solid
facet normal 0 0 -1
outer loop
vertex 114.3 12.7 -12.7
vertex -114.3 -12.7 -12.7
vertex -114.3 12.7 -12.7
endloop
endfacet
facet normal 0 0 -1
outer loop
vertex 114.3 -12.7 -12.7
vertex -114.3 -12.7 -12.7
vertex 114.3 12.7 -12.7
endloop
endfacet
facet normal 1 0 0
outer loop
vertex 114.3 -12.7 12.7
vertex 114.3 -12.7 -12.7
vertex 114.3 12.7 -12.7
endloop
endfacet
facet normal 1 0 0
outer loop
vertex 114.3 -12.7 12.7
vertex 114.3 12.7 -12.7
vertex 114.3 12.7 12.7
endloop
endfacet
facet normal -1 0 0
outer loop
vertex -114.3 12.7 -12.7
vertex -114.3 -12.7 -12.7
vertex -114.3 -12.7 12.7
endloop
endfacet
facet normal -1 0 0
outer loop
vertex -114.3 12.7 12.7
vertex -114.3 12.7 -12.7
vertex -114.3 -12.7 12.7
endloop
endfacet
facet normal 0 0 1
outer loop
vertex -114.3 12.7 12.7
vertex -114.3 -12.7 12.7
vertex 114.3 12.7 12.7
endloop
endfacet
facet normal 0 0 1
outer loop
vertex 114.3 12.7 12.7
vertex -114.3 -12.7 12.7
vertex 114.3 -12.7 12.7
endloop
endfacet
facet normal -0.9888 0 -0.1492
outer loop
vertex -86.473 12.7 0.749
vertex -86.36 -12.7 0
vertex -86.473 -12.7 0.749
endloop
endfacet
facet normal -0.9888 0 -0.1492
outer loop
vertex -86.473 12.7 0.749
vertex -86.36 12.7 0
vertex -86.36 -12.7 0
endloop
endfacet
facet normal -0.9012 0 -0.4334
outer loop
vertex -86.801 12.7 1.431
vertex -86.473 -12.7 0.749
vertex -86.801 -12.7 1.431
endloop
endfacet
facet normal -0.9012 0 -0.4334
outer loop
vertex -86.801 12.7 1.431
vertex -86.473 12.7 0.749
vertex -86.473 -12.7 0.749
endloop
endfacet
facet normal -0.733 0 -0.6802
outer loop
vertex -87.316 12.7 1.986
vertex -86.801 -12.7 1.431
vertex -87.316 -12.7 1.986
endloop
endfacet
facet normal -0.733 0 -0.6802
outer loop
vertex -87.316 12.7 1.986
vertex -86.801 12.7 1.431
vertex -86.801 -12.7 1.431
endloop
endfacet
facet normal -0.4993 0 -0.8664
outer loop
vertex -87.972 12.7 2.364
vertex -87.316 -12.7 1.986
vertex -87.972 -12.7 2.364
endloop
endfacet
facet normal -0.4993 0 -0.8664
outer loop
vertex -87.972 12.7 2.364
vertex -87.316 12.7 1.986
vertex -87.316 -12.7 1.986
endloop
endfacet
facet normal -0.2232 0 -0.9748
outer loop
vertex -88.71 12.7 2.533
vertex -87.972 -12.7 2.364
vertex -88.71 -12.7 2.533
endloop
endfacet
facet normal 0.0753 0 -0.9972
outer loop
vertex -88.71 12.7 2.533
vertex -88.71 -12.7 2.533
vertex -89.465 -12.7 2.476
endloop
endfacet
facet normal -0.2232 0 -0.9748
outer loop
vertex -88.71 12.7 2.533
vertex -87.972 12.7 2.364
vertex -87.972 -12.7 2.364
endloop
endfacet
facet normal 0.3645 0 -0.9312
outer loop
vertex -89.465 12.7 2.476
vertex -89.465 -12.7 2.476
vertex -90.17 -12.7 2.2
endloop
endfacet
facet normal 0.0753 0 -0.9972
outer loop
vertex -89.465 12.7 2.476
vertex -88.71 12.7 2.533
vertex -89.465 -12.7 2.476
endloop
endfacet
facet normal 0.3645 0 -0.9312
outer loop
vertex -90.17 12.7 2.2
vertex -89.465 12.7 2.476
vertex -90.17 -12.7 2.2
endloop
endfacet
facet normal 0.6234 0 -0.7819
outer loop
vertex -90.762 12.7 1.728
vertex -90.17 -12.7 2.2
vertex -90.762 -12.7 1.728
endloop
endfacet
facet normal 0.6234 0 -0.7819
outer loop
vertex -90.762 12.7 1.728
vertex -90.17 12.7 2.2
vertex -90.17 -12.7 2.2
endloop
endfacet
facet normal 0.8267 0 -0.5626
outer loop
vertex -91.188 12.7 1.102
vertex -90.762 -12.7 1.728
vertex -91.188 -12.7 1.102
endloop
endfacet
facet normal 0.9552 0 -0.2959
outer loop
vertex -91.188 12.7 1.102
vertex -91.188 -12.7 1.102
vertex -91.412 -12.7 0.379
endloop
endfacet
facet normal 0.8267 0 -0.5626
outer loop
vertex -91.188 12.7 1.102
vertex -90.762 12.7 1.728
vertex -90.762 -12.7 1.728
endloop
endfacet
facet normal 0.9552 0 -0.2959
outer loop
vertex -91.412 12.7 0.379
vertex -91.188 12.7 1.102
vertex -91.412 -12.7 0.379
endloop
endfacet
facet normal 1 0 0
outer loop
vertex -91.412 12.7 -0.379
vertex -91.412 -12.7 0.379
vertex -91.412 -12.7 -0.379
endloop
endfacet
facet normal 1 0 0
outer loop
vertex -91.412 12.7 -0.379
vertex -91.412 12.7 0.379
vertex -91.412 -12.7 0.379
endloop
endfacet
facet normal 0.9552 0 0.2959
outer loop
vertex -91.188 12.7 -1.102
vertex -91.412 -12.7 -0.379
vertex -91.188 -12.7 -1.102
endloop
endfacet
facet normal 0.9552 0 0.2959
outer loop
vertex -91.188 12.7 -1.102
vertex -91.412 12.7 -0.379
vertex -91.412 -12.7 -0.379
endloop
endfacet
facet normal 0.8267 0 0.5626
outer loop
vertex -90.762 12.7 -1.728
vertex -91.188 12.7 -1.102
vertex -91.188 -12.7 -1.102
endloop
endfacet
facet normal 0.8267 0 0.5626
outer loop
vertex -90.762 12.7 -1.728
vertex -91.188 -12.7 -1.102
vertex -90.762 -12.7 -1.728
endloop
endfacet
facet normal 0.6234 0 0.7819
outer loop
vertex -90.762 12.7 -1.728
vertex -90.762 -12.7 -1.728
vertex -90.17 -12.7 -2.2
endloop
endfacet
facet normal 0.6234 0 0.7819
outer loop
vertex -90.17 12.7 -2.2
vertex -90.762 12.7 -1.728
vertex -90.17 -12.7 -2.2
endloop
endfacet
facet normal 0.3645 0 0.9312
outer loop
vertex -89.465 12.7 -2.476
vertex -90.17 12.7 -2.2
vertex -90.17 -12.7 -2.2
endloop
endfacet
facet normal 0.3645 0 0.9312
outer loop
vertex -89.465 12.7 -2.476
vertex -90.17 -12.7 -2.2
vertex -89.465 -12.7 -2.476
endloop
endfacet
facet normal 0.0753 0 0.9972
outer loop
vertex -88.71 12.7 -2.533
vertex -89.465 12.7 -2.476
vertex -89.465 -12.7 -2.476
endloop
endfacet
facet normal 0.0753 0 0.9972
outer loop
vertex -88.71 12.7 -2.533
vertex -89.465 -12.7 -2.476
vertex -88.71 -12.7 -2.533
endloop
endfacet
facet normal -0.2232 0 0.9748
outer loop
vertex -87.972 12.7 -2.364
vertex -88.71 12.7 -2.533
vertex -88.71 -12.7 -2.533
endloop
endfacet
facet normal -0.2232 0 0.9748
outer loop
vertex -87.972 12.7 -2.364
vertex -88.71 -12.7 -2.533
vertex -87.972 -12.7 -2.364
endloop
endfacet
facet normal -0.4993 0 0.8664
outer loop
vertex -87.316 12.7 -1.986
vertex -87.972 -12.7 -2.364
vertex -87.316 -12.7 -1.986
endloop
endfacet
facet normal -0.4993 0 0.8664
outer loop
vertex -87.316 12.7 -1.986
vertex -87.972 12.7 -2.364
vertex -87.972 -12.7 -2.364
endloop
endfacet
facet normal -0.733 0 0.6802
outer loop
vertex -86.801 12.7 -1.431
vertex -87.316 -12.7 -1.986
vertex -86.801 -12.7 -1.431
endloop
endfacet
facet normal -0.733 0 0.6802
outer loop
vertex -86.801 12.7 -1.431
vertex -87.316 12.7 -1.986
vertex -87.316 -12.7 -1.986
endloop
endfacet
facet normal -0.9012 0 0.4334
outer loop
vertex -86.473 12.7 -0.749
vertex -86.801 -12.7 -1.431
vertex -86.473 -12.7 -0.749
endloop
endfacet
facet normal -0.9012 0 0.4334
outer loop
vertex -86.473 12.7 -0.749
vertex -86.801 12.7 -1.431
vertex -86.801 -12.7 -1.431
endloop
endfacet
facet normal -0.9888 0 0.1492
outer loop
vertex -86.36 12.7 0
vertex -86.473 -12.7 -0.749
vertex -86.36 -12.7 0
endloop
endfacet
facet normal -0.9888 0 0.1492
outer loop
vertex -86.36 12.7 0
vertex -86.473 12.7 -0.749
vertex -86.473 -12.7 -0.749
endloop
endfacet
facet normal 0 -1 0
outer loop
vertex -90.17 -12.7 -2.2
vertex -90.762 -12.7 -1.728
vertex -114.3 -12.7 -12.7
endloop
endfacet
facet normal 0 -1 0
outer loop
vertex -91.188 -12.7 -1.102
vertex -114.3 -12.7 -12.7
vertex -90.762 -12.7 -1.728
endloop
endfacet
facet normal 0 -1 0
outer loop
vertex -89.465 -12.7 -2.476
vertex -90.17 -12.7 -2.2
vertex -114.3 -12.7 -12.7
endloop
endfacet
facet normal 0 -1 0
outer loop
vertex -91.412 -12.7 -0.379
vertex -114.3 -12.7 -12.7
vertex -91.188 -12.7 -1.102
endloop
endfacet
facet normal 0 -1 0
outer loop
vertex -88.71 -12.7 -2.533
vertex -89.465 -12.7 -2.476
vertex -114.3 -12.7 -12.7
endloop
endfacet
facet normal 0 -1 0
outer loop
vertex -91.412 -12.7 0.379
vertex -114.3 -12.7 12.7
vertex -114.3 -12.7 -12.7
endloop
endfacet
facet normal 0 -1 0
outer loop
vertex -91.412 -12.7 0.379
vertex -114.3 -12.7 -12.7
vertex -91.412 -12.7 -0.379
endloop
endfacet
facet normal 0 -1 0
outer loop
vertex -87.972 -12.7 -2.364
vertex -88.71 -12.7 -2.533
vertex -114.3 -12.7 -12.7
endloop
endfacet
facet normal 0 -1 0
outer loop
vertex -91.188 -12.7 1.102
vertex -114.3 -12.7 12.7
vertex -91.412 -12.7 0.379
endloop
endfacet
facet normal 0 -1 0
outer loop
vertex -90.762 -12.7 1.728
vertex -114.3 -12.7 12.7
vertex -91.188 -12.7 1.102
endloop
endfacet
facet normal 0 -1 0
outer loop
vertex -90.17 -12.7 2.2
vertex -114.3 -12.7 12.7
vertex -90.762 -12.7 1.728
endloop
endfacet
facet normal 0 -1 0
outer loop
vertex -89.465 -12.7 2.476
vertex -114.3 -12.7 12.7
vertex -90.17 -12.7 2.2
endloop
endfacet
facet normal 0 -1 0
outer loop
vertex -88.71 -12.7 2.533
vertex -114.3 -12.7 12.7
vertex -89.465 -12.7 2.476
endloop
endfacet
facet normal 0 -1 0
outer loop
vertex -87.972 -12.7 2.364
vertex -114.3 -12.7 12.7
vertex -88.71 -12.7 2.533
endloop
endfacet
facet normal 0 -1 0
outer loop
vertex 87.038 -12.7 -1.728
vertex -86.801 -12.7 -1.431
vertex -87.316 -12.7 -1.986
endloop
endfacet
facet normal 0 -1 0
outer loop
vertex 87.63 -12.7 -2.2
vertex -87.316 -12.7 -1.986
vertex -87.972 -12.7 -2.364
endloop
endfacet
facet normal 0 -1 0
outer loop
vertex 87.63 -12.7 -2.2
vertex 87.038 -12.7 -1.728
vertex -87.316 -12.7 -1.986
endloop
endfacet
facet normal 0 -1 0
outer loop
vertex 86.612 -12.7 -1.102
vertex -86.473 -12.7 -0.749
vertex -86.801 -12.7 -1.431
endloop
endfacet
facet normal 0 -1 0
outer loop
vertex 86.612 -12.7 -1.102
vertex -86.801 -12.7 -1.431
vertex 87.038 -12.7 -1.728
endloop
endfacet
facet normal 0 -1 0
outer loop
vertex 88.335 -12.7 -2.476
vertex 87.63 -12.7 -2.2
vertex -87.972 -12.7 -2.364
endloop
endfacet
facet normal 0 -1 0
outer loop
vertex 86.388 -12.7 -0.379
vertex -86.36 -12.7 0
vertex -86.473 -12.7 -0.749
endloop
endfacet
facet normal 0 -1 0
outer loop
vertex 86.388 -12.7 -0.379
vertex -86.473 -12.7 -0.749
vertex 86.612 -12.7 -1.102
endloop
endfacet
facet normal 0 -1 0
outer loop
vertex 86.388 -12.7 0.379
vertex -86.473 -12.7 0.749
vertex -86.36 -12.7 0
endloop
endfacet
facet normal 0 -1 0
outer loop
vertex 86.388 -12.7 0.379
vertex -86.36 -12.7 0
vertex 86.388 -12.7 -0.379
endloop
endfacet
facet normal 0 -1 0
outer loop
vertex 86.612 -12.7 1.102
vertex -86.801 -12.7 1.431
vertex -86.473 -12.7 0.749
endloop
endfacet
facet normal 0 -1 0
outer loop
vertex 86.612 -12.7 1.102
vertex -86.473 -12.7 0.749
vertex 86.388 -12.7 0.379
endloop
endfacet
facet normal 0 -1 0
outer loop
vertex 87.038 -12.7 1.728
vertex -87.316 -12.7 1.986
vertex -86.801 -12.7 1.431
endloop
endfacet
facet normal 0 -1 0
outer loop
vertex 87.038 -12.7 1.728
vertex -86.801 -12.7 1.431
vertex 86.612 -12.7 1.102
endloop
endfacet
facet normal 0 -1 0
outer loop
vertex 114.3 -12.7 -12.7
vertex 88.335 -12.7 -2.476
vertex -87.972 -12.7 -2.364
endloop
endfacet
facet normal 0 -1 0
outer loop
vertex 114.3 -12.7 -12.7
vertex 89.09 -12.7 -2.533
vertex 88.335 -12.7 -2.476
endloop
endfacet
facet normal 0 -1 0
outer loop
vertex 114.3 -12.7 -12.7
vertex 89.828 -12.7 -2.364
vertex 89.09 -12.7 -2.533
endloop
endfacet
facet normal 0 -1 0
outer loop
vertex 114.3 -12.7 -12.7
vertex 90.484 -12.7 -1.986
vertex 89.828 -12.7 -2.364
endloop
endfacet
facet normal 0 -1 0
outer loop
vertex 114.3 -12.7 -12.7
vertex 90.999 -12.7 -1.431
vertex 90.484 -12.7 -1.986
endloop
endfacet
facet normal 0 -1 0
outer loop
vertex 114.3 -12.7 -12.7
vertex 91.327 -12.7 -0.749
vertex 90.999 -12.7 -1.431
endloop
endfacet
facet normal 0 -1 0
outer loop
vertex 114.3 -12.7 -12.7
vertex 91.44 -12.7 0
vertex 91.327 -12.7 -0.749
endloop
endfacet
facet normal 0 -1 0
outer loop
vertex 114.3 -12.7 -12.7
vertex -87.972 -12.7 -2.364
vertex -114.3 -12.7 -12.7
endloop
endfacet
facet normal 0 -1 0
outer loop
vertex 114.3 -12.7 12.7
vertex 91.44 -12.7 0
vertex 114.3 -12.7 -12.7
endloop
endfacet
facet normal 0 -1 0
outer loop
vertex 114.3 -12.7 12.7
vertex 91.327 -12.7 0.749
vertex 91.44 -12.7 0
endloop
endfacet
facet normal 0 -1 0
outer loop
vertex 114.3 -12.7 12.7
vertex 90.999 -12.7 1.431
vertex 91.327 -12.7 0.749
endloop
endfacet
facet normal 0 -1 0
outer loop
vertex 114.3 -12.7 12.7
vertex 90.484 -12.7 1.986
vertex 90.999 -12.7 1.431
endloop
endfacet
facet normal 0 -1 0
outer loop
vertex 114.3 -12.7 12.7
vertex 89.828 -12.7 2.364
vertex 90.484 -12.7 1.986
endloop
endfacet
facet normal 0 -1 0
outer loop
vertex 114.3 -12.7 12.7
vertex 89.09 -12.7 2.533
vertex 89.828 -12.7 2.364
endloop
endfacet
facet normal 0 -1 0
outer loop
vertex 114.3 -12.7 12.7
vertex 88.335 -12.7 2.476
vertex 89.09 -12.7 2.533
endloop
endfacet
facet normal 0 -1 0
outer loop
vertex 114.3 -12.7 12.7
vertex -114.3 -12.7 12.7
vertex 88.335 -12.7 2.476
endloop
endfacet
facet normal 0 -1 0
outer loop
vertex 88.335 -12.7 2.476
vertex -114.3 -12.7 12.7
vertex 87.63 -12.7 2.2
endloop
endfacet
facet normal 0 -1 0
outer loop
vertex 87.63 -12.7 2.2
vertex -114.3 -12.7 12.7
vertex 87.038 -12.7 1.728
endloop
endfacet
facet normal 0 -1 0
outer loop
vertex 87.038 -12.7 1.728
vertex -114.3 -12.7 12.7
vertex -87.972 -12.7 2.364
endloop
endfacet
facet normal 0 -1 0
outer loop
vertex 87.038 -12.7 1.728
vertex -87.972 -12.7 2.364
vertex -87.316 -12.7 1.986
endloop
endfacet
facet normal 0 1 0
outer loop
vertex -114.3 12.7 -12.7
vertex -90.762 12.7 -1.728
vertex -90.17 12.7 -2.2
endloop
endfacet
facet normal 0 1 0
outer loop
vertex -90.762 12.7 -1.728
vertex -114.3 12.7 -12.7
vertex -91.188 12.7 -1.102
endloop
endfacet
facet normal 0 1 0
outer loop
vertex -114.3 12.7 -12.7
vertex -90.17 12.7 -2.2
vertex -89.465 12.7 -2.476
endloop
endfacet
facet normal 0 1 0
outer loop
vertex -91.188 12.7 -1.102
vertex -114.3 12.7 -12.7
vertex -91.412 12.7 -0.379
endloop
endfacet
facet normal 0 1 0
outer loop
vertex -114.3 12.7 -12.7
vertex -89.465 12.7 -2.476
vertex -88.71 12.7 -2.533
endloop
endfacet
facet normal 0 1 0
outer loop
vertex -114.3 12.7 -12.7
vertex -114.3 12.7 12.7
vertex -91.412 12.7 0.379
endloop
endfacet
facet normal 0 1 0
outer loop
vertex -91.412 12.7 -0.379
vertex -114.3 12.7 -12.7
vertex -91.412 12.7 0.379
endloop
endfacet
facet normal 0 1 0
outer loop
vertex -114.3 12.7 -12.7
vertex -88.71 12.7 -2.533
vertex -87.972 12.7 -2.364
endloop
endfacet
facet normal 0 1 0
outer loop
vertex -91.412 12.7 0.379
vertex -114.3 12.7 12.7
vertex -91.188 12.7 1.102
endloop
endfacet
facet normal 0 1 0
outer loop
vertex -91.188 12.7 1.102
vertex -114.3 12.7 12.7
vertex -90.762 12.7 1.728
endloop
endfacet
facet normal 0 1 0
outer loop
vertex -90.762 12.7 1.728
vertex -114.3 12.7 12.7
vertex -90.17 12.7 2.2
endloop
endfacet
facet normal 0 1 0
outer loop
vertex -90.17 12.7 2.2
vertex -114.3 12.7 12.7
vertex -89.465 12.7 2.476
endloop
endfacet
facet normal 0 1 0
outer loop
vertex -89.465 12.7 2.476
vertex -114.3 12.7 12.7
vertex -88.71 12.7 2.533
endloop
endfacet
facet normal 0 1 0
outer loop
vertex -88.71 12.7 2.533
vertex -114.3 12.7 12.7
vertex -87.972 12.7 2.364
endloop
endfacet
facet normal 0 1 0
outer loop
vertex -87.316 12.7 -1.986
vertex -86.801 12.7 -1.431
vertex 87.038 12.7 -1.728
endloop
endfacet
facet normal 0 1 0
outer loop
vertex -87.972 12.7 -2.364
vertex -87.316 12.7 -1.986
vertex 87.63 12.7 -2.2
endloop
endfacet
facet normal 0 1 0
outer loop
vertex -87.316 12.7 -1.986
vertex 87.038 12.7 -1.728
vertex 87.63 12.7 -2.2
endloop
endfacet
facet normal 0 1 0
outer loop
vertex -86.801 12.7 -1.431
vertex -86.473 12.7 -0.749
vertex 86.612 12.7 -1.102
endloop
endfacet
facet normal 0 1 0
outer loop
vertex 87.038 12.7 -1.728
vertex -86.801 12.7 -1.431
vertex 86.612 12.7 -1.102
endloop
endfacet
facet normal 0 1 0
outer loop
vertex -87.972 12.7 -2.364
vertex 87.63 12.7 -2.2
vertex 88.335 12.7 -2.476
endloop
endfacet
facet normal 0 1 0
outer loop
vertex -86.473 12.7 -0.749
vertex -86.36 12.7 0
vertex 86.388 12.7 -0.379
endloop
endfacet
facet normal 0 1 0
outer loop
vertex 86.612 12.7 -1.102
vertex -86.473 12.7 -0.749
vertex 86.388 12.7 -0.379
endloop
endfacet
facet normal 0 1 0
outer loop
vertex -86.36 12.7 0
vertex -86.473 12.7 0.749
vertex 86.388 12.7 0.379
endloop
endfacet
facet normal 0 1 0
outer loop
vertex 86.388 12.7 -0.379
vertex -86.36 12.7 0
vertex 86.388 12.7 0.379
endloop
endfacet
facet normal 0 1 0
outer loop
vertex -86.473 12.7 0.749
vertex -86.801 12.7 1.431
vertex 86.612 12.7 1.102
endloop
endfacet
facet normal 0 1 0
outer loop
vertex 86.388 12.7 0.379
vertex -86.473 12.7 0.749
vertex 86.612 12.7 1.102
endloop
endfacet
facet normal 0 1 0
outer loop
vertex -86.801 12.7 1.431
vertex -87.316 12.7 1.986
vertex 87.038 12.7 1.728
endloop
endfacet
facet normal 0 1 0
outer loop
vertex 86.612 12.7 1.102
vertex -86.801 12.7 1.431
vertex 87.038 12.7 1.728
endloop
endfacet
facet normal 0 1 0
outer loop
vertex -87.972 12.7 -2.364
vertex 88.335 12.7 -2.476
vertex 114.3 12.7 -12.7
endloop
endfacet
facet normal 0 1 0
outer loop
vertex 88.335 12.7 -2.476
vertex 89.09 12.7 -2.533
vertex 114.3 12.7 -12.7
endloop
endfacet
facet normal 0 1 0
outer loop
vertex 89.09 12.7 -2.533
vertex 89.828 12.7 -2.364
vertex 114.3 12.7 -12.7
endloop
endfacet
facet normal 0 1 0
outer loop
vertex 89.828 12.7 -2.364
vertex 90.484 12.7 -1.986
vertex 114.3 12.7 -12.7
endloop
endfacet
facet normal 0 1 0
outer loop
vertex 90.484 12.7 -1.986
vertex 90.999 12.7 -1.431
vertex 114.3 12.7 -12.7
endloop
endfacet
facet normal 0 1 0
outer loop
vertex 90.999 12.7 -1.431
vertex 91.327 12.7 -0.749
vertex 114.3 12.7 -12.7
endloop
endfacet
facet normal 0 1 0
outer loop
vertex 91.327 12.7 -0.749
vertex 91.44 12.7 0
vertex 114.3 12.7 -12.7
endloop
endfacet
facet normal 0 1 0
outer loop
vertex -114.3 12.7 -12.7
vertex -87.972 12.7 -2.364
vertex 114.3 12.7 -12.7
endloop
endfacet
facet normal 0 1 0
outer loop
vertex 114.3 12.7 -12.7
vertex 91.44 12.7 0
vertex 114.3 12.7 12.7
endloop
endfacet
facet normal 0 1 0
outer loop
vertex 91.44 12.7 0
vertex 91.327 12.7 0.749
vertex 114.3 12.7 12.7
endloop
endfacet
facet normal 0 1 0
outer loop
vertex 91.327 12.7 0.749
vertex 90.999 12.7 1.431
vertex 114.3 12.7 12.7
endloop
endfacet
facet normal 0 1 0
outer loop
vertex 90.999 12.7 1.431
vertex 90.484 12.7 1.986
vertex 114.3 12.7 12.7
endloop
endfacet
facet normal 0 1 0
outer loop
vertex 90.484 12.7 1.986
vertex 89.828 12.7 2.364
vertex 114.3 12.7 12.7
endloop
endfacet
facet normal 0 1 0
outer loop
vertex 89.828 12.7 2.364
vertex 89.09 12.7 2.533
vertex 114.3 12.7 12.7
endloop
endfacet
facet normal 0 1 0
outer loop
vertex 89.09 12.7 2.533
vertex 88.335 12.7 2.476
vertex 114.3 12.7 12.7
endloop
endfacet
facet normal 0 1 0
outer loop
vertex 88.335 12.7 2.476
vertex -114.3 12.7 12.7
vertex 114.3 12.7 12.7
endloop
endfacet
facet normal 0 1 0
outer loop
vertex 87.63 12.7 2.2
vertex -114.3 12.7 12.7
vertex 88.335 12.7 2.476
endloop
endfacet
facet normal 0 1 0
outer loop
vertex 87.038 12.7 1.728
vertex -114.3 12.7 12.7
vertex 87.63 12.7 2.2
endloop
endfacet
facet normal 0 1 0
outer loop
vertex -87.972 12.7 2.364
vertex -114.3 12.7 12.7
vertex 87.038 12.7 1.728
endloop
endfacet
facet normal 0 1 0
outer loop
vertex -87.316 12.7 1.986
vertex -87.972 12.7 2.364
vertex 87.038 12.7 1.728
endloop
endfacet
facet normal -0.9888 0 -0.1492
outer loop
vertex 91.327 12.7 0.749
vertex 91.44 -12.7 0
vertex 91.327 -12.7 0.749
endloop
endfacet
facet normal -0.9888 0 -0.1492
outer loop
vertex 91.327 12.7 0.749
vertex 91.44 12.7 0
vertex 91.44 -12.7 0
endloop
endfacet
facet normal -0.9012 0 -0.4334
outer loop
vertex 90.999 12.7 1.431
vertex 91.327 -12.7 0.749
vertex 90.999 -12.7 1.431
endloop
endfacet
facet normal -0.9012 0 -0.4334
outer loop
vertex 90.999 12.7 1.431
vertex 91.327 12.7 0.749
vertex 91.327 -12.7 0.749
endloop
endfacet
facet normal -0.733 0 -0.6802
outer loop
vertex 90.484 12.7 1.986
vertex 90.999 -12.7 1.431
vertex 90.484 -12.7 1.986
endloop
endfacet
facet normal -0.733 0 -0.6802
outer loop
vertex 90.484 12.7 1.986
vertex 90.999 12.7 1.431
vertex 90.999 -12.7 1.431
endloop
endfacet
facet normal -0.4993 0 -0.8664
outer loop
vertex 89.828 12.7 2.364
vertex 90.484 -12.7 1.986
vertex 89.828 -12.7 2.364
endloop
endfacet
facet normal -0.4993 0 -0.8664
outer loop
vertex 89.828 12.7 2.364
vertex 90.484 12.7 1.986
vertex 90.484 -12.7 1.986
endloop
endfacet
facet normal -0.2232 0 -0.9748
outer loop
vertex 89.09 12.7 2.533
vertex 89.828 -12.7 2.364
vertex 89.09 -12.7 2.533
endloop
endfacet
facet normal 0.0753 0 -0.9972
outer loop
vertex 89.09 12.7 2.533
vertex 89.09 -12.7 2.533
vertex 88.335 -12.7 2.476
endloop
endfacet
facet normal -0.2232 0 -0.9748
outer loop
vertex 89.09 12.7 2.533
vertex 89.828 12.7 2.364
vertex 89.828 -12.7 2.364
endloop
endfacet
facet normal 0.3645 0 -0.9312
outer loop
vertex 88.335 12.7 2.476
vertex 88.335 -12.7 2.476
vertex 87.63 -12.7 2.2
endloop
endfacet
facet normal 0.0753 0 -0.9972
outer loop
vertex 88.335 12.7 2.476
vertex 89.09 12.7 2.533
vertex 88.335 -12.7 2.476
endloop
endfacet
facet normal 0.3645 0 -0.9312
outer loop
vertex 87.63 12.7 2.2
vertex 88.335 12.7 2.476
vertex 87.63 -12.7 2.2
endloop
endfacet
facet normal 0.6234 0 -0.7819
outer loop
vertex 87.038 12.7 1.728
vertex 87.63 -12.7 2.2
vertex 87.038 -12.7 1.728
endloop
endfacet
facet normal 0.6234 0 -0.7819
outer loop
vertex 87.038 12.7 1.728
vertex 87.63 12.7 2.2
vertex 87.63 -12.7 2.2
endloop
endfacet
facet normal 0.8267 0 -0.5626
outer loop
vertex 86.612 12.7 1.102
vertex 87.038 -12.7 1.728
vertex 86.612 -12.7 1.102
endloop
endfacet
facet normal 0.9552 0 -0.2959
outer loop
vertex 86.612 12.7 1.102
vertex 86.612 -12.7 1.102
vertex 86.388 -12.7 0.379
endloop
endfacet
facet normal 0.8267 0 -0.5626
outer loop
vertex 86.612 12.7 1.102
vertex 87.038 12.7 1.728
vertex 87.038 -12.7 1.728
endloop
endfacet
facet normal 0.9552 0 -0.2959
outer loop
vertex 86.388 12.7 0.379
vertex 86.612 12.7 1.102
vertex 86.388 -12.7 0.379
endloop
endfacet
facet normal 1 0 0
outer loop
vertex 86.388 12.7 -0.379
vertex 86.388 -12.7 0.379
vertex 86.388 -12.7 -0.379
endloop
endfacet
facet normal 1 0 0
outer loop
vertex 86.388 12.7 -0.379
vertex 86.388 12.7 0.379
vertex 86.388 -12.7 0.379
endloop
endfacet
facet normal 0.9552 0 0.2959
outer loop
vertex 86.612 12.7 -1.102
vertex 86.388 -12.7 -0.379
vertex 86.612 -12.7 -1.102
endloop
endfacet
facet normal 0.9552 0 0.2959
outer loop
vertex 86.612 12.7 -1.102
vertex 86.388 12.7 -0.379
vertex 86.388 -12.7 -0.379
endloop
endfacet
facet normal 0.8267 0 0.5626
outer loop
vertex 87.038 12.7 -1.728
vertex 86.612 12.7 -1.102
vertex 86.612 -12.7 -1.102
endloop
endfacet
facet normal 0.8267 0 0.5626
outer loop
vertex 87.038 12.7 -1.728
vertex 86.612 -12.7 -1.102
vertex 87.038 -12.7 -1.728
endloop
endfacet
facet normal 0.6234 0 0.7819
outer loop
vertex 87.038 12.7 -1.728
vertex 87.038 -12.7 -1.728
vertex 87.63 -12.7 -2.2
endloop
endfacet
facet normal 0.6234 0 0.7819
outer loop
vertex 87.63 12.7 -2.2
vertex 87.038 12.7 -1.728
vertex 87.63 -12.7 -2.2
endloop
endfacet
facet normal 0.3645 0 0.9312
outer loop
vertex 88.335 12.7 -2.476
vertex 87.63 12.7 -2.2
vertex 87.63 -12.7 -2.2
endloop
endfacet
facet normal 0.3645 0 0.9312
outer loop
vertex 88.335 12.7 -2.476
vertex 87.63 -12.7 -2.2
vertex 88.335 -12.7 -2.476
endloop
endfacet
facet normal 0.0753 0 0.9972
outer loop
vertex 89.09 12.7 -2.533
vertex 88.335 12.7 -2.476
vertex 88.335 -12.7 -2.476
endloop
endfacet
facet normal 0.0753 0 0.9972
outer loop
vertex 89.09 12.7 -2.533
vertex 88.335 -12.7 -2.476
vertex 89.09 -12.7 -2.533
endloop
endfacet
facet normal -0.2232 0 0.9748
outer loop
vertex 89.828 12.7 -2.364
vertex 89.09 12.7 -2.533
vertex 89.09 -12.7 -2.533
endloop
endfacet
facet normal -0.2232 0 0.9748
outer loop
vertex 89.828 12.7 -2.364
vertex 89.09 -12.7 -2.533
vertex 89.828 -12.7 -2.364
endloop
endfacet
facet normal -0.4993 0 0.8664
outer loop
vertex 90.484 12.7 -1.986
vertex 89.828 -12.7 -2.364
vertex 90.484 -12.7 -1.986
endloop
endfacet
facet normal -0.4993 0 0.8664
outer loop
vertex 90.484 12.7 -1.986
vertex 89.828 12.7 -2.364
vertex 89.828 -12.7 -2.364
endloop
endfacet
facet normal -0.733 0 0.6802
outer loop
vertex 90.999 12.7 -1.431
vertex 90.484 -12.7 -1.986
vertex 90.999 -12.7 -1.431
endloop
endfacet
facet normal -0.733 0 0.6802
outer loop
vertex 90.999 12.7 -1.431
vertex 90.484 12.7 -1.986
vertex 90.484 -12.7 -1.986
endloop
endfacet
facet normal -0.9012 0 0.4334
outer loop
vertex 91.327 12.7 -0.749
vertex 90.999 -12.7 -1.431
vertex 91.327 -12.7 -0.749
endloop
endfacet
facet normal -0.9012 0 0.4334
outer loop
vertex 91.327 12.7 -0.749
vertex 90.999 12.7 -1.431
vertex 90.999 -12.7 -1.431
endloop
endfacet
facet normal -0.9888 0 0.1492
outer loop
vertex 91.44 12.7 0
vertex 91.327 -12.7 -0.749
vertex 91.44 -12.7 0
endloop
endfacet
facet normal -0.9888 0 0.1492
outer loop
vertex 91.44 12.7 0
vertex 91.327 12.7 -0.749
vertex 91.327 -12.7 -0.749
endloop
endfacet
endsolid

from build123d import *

# Parameters (mm, degrees)
F0_W     = 228.6
F0_H     = 25.4
F0_R     = 3.81
F0_R_2   = 2.54
F1_DEPTH = 12.7


with BuildPart() as f1:
    # F0 (on Front) → F1 (new body, symmetric)
    with BuildSketch(Plane.XZ):
        Rectangle(F0_W, F0_H)
        with Locations((-88.9, 0)):
            Circle(F0_R, mode=Mode.SUBTRACT)
        with Locations((88.9, 0)):
            Circle(F0_R, mode=Mode.SUBTRACT)
        with Locations((88.9, 0)):
            Circle(F0_R)
        with Locations((88.9, 0)):
            Circle(F0_R_2, mode=Mode.SUBTRACT)
        with Locations((-88.9, 0)):
            Circle(F0_R)
        with Locations((-88.9, 0)):
            Circle(F0_R_2, mode=Mode.SUBTRACT)
    extrude(amount=F1_DEPTH, both=True)


solid = f1.part
